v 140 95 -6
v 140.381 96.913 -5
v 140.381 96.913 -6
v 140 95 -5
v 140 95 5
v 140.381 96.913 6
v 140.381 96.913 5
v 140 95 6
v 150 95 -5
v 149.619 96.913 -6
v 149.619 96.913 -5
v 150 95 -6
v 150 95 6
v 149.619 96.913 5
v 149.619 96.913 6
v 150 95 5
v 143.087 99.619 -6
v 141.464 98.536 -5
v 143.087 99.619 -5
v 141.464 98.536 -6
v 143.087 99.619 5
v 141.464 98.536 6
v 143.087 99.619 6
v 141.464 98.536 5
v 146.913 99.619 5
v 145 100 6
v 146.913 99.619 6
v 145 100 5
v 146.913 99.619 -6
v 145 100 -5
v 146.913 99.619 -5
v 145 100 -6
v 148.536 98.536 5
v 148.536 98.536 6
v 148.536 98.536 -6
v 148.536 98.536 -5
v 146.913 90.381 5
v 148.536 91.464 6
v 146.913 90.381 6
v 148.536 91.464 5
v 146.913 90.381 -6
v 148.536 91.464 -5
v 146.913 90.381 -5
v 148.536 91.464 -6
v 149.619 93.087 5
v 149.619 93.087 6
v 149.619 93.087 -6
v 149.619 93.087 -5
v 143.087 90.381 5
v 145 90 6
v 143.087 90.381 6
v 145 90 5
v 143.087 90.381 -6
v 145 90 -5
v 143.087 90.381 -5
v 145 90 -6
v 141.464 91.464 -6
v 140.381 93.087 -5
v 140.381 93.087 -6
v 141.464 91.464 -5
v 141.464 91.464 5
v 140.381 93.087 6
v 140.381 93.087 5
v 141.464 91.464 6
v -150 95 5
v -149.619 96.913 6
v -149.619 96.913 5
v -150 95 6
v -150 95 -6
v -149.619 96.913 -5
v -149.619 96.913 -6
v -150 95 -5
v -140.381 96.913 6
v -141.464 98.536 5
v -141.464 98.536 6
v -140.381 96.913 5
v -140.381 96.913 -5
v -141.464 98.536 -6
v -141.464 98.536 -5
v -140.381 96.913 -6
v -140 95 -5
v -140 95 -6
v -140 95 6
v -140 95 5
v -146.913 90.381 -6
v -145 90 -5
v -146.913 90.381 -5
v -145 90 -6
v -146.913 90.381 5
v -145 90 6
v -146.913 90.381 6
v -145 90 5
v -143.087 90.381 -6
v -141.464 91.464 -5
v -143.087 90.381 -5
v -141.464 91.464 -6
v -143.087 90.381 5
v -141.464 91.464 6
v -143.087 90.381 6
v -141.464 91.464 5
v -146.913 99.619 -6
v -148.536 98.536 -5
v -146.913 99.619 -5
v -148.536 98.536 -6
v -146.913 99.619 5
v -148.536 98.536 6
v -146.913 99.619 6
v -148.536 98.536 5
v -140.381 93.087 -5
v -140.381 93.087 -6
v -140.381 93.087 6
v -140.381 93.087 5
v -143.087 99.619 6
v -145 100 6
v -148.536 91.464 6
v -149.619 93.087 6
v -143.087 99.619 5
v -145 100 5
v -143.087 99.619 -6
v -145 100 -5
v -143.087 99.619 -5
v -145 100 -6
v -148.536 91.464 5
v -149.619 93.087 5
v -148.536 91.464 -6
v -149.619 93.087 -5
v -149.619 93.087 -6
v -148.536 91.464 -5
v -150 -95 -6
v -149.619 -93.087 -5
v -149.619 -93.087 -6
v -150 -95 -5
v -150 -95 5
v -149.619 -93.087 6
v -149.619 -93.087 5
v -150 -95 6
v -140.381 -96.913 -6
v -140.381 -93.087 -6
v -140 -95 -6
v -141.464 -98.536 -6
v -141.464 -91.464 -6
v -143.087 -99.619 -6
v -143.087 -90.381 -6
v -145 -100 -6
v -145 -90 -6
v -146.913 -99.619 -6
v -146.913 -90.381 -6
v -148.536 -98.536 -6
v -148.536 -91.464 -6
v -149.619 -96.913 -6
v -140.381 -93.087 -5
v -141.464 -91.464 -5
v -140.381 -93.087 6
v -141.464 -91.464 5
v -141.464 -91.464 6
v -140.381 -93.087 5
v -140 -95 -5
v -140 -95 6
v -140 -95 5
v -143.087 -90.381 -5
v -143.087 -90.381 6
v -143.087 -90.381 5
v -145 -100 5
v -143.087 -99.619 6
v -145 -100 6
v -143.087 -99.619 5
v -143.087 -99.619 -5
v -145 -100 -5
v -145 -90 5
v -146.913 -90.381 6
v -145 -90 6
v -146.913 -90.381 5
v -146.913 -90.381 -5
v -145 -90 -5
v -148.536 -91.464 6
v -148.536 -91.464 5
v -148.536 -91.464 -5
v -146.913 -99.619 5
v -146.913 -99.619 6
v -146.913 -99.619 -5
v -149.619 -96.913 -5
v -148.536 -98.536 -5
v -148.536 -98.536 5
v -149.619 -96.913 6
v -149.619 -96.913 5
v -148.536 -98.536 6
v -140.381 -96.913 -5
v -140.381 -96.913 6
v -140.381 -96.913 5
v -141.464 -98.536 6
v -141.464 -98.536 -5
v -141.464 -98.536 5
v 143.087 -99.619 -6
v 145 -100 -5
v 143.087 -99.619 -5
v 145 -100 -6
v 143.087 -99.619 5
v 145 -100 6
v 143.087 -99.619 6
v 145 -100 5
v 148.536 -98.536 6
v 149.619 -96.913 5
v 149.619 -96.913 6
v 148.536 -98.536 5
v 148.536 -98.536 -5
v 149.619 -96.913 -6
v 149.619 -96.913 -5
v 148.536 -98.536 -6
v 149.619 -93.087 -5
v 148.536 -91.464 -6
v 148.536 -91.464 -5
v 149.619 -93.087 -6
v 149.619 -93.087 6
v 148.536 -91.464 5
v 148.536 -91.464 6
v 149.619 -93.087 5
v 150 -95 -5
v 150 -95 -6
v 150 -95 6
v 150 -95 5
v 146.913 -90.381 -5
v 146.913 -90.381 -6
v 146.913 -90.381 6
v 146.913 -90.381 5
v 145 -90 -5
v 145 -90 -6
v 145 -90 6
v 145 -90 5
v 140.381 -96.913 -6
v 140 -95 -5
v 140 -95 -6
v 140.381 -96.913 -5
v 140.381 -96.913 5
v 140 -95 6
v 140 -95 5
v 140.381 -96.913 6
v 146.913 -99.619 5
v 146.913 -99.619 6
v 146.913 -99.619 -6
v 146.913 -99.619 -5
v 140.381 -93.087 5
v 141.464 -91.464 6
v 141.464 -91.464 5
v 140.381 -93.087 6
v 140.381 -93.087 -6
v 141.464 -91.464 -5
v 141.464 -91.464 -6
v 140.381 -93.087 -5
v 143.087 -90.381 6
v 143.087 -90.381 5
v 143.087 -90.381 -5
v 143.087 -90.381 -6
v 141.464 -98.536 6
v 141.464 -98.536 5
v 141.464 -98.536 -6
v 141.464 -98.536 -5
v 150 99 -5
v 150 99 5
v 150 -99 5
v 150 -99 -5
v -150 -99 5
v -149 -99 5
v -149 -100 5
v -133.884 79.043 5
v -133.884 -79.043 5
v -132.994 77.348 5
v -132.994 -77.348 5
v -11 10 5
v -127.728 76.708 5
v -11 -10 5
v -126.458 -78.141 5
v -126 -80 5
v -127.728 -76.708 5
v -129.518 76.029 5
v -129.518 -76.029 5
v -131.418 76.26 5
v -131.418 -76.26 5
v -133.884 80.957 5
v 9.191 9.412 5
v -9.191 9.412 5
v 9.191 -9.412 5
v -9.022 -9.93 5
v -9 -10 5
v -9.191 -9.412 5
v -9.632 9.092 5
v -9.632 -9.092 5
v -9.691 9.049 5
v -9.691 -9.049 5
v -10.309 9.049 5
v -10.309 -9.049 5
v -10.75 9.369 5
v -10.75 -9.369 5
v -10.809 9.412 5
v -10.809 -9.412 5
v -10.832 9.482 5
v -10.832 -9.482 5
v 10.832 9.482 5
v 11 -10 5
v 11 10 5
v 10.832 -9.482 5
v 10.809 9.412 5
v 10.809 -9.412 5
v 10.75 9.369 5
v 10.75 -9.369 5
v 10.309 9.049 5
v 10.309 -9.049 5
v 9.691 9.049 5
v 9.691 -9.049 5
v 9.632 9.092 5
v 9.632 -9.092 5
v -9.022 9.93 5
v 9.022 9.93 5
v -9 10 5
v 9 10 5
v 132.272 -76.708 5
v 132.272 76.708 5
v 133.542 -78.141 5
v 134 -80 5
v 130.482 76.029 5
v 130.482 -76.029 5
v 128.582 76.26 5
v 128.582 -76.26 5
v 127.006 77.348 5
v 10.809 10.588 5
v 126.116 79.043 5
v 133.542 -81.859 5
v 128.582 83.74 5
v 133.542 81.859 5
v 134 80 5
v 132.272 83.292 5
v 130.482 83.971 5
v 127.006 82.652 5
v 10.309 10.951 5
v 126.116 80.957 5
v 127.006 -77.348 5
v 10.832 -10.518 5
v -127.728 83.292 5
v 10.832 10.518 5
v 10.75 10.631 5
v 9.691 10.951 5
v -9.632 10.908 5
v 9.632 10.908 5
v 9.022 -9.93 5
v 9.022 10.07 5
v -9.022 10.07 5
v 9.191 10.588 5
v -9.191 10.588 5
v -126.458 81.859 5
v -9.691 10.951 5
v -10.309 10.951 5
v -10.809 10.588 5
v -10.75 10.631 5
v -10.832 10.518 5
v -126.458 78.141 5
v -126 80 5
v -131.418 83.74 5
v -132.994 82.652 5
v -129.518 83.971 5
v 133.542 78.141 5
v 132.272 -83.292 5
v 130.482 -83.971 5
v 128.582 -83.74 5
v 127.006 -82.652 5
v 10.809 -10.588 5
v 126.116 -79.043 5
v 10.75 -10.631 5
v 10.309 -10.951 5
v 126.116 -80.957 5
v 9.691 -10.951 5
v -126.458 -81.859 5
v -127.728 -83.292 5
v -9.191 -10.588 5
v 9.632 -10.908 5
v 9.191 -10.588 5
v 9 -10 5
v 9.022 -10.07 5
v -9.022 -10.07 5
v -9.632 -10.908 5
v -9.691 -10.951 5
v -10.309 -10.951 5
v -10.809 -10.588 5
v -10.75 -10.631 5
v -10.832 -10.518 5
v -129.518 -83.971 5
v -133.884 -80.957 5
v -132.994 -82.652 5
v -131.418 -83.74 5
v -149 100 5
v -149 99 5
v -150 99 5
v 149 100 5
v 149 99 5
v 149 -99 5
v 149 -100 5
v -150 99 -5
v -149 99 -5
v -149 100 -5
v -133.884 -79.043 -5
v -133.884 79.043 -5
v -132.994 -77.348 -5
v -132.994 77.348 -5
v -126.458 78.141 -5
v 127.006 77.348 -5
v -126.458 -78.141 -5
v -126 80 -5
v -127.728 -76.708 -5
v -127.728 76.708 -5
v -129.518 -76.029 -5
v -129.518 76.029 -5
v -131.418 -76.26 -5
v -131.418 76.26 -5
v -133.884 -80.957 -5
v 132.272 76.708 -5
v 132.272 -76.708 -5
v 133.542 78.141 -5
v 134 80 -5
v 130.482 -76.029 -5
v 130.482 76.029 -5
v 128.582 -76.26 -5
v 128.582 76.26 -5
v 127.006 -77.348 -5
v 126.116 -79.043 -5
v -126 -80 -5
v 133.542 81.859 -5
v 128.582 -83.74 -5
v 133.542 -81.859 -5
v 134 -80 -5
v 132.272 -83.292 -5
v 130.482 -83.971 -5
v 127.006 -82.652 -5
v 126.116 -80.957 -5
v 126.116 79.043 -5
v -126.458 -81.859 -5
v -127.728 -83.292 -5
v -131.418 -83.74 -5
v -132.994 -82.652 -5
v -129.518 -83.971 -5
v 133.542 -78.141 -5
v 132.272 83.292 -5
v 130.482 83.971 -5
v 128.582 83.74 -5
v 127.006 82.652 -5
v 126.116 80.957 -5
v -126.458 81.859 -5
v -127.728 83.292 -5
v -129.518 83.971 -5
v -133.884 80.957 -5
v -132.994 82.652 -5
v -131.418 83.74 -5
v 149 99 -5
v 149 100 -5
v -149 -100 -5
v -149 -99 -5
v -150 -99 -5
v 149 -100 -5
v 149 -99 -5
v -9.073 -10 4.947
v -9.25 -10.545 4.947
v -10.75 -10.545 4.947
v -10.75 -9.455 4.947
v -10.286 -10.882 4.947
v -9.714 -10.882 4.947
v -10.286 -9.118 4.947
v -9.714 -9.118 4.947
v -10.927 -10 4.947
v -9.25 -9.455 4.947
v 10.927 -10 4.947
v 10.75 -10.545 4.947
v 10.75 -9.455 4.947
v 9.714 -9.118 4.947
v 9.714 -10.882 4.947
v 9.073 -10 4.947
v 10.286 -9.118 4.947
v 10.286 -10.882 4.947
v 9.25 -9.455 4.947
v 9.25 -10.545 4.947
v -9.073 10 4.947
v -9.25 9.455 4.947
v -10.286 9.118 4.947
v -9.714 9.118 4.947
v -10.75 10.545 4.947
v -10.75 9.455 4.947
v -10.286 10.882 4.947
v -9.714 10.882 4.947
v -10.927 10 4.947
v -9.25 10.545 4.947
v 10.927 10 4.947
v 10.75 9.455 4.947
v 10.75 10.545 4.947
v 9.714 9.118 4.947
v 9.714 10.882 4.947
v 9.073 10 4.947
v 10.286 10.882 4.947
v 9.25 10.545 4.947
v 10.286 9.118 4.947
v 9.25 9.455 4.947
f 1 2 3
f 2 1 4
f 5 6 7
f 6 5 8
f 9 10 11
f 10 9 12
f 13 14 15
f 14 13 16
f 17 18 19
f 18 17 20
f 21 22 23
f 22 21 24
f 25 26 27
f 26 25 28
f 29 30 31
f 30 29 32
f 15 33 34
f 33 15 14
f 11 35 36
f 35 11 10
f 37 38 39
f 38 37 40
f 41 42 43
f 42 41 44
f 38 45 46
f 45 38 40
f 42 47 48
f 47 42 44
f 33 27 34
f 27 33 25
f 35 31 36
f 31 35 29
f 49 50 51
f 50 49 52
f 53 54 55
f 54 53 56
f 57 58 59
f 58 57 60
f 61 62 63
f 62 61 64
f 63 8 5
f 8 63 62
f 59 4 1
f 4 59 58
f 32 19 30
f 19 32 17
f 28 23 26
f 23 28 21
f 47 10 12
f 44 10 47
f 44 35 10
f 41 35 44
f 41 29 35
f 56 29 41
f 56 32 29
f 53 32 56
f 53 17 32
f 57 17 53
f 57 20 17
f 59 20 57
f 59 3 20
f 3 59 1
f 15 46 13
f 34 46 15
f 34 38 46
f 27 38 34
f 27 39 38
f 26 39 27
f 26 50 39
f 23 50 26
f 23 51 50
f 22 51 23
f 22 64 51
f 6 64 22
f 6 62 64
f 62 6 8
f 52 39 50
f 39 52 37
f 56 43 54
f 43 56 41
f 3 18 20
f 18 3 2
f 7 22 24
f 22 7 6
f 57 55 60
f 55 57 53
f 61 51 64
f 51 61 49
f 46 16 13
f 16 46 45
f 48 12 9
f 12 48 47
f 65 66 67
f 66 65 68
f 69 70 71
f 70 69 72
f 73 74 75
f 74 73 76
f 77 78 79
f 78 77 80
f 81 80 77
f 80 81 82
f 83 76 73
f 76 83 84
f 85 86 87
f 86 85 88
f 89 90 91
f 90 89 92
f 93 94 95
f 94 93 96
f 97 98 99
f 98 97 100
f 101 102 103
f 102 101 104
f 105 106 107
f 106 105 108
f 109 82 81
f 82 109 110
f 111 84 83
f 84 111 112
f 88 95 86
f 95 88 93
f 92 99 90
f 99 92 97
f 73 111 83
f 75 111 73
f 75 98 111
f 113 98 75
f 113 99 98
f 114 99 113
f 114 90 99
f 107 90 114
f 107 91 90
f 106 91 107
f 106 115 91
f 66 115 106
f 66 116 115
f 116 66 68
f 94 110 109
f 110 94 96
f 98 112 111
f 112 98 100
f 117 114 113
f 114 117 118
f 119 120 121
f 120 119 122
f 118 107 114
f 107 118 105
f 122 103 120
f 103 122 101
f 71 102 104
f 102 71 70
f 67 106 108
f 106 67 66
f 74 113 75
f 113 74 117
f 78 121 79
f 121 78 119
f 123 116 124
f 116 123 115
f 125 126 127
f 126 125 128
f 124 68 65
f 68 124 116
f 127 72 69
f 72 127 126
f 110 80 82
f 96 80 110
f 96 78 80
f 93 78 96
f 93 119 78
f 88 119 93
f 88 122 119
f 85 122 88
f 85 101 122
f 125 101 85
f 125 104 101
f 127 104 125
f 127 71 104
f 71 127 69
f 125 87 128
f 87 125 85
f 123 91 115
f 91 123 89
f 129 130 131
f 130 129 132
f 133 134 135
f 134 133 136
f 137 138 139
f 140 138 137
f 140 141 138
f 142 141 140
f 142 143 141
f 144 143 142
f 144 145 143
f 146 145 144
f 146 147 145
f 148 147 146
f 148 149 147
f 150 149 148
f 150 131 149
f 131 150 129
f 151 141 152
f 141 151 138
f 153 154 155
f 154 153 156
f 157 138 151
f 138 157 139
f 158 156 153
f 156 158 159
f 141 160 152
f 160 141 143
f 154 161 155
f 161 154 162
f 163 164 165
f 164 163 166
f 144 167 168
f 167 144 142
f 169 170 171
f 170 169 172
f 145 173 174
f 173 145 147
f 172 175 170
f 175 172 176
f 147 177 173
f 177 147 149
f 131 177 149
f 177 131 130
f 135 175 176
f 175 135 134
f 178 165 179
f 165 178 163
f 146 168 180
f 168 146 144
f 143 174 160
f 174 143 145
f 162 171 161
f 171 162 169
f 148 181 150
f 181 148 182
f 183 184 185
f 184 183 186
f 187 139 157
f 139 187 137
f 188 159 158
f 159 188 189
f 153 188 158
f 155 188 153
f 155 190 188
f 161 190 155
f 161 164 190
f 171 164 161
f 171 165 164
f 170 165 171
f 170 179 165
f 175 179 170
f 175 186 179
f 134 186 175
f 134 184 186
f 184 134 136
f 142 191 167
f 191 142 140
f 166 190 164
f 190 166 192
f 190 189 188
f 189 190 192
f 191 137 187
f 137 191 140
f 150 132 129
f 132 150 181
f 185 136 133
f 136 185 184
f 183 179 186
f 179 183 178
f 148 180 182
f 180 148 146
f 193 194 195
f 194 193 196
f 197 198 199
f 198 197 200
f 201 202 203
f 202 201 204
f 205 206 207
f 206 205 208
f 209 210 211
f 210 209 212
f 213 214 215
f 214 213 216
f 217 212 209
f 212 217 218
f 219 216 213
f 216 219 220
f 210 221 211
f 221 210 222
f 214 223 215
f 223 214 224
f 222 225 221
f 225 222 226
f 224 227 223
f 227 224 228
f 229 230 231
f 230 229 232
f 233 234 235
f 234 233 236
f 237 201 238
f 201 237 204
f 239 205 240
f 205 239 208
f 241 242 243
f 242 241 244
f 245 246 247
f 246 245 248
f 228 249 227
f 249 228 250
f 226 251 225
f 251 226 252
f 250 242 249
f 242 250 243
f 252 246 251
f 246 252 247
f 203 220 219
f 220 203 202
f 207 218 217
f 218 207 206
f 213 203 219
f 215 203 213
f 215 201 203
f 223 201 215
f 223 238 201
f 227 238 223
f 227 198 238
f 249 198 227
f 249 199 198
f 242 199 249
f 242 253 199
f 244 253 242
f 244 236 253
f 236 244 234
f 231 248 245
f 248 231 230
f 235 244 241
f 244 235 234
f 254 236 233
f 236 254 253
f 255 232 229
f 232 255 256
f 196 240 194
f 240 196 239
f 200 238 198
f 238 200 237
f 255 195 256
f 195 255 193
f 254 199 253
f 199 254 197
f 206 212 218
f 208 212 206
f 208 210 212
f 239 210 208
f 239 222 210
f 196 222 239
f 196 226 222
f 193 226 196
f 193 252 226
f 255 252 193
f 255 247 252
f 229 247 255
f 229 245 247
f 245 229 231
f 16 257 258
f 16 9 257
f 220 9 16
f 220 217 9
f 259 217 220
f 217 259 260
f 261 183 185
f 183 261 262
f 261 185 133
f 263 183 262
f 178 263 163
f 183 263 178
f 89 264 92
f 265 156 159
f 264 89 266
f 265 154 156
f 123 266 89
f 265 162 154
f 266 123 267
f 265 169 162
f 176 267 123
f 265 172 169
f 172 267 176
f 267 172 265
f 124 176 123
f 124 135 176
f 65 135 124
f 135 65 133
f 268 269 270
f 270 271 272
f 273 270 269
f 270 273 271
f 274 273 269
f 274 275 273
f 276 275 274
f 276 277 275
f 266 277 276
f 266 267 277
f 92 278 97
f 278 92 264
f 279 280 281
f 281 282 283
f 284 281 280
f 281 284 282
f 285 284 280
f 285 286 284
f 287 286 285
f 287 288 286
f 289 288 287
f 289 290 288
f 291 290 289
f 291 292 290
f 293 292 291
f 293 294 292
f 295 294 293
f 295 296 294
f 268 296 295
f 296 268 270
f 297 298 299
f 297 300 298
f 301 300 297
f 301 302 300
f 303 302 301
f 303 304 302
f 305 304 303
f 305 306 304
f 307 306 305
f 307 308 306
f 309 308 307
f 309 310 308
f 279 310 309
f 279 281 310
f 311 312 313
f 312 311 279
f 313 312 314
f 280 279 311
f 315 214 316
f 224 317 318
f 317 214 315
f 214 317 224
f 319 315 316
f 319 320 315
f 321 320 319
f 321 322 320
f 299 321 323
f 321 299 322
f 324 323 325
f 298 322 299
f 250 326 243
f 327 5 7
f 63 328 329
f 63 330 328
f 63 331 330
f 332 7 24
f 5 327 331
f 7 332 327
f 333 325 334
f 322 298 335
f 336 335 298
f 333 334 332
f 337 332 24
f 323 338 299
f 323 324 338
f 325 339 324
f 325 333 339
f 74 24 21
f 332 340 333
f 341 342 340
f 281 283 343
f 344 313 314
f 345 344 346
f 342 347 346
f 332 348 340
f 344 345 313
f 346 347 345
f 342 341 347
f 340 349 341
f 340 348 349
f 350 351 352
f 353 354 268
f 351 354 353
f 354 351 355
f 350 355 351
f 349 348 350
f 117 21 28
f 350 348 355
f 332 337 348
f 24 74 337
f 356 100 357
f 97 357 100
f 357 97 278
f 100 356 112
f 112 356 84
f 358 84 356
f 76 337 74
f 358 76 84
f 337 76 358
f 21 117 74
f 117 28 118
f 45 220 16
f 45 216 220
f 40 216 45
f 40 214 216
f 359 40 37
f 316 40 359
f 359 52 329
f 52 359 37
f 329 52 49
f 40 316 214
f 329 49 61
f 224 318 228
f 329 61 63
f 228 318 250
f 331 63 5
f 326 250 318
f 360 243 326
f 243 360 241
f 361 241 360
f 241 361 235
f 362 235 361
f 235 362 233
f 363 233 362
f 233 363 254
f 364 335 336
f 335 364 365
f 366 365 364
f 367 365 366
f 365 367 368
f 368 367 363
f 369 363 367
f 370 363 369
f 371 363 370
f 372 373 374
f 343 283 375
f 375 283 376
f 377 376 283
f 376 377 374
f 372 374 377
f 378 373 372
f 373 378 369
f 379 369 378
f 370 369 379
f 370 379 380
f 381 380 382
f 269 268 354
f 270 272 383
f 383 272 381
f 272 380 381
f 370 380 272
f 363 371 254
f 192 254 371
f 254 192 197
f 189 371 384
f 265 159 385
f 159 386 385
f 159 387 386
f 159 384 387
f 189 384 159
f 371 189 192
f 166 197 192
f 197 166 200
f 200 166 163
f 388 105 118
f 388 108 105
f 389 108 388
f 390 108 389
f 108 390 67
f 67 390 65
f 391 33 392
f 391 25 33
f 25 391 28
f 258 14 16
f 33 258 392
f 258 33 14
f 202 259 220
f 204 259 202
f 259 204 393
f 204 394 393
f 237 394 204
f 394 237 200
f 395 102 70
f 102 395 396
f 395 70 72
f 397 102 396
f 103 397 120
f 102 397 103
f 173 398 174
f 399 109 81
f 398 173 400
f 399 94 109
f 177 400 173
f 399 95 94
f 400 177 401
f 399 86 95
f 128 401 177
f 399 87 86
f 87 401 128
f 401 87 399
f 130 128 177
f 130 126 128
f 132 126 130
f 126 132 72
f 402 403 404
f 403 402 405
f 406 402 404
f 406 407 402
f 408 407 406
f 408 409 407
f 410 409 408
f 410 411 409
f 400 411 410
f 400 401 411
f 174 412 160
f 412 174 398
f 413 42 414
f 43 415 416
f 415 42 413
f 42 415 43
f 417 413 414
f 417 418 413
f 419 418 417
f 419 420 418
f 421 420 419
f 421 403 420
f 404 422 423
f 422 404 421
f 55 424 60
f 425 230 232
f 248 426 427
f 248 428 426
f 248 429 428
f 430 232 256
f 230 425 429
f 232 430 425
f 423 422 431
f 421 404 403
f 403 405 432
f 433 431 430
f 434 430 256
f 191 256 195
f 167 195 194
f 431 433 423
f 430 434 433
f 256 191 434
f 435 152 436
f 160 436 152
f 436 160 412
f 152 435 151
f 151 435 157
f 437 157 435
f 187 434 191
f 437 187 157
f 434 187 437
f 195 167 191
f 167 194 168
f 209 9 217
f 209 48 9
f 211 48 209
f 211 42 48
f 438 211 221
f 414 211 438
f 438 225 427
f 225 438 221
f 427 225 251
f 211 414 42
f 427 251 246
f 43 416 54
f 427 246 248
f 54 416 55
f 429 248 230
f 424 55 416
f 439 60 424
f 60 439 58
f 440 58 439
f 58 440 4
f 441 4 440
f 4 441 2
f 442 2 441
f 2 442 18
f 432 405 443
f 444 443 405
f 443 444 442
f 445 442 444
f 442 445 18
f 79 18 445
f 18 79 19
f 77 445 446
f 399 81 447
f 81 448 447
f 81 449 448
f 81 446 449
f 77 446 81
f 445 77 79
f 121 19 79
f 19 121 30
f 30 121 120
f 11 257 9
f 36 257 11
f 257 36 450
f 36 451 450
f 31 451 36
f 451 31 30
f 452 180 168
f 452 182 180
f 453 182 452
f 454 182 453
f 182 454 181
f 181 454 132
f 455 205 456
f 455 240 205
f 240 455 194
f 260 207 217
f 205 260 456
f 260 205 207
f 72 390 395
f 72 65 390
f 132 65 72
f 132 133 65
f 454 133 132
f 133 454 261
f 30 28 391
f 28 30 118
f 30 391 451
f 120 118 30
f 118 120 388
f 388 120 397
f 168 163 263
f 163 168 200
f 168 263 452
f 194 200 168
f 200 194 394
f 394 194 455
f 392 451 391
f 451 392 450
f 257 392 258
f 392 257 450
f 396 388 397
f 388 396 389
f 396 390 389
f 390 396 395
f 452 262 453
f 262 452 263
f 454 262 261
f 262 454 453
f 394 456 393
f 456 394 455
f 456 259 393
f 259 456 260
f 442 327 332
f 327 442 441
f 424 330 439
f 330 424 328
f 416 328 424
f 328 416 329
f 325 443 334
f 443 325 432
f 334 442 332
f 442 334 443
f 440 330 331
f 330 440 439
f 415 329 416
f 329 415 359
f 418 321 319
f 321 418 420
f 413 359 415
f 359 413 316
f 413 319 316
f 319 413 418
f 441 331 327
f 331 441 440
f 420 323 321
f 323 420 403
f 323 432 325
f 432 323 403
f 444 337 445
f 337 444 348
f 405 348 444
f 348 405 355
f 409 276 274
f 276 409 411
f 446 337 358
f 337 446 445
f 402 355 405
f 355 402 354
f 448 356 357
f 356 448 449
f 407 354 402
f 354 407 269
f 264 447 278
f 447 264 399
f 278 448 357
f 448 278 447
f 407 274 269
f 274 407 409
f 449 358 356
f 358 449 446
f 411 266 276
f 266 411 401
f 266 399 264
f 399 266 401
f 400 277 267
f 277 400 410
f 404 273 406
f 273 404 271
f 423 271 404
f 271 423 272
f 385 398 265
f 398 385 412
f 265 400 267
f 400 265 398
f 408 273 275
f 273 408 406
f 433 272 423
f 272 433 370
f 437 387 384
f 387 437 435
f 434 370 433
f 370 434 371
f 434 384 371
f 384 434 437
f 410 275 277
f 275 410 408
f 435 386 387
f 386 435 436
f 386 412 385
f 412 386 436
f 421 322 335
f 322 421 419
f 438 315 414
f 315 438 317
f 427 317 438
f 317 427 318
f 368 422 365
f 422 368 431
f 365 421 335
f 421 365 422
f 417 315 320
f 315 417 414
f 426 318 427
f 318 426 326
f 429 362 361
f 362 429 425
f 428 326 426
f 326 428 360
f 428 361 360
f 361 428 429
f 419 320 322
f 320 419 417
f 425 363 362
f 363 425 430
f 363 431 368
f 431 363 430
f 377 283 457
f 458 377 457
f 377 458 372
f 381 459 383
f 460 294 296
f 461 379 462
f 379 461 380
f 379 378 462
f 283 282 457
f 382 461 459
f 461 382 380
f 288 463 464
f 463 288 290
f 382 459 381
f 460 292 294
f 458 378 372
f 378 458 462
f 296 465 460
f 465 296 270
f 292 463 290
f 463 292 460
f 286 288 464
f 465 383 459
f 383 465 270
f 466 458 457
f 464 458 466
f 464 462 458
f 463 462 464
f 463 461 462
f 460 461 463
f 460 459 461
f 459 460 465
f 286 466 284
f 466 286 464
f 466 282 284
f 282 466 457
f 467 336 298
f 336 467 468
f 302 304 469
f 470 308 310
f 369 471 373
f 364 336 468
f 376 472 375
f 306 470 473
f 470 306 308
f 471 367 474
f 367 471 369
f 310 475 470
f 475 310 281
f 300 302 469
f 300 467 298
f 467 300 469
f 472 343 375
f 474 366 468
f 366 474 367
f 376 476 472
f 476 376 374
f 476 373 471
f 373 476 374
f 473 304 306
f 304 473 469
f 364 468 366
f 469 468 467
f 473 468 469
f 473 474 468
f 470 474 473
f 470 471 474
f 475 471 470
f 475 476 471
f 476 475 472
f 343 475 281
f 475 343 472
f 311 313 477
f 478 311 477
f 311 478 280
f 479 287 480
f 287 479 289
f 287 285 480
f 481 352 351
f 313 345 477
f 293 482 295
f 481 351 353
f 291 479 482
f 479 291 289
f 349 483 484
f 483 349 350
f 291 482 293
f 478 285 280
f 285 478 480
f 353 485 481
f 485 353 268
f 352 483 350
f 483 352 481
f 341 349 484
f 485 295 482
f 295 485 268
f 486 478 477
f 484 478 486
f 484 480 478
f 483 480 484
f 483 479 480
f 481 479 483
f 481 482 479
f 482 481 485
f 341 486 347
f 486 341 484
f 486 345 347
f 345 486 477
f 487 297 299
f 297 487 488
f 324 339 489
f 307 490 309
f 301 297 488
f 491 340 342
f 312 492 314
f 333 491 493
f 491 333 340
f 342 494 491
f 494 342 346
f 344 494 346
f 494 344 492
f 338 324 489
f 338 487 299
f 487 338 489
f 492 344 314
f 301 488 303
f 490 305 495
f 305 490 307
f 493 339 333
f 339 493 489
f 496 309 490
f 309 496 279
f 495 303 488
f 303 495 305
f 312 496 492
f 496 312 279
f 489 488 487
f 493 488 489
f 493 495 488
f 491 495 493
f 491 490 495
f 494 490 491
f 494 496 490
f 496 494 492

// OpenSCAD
// Parameters
plate_length = 300; //[150:600:1]
plate_width = 200; //[100:400:1]
plate_thickness = 10; //[5:20:1]
corner_radius = 5; //[0:20:1]
chamfer_size = 1; //[0:5:0.5]
corner_overlap = 1; //[0.5:2:0.5]
hole_diameter = 8; //[3:20:0.5]
hole_edge_margin = 20; //[10:60:1]
hole_through_extra = 2; //[1:5:0.5]
texture_depth = 0.2; //[0:1:0.05]
texture_pitch = 20; //[10:60:1]
texture_dimple_radius = 3; //[1:10:0.5]

// Base shapes
module tooling_plate_body() {
  translate([0, 0, 0])
    cube([plate_length, plate_width, plate_thickness], center=true);
}

module corner_round_cyl() {
  translate([plate_length/2 - corner_radius, plate_width/2 - corner_radius, 0])
    cylinder(h=plate_thickness + 2*corner_overlap, r=corner_radius, center=true);
}

module corner_round_cyl_2() {
  translate([-plate_length/2 + corner_radius, plate_width/2 - corner_radius, 0])
    cylinder(h=plate_thickness + 2*corner_overlap, r=corner_radius, center=true);
}

module corner_round_cyl_3() {
  translate([-plate_length/2 + corner_radius, -plate_width/2 + corner_radius, 0])
    cylinder(h=plate_thickness + 2*corner_overlap, r=corner_radius, center=true);
}

module corner_round_cyl_4() {
  translate([plate_length/2 - corner_radius, -plate_width/2 + corner_radius, 0])
    cylinder(h=plate_thickness + 2*corner_overlap, r=corner_radius, center=true);
}

module corner_chamfer_cut_1() {
  translate([plate_length/2 - chamfer_size/2, plate_width/2 - chamfer_size/2, 0])
    cube([chamfer_size, chamfer_size, plate_thickness + 2*corner_overlap], center=true);
}

module corner_chamfer_cut_2() {
  translate([-plate_length/2 + chamfer_size/2, plate_width/2 - chamfer_size/2, 0])
    cube([chamfer_size, chamfer_size, plate_thickness + 2*corner_overlap], center=true);
}

module corner_chamfer_cut_3() {
  translate([-plate_length/2 + chamfer_size/2, -plate_width/2 + chamfer_size/2, 0])
    cube([chamfer_size, chamfer_size, plate_thickness + 2*corner_overlap], center=true);
}

module corner_chamfer_cut_4() {
  translate([plate_length/2 - chamfer_size/2, -plate_width/2 + chamfer_size/2, 0])
    cube([chamfer_size, chamfer_size, plate_thickness + 2*corner_overlap], center=true);
}

module mount_hole_1() {
  translate([plate_length/2 - hole_edge_margin, plate_width/2 - hole_edge_margin, 0])
    cylinder(h=plate_thickness + hole_through_extra, r=hole_diameter/2, center=true);
}

module mount_hole_2() {
  translate([-plate_length/2 + hole_edge_margin, plate_width/2 - hole_edge_margin, 0])
    cylinder(h=plate_thickness + hole_through_extra, r=hole_diameter/2, center=true);
}

module mount_hole_3() {
  translate([-plate_length/2 + hole_edge_margin, -plate_width/2 + hole_edge_margin, 0])
    cylinder(h=plate_thickness + hole_through_extra, r=hole_diameter/2, center=true);
}

module mount_hole_4() {
  translate([plate_length/2 - hole_edge_margin, -plate_width/2 + hole_edge_margin, 0])
    cylinder(h=plate_thickness + hole_through_extra, r=hole_diameter/2, center=true);
}

module texture_dimple_1() {
  translate([-texture_pitch/2, -texture_pitch/2, plate_thickness/2 - texture_depth + texture_dimple_radius])
    sphere(r=texture_dimple_radius, center=true);
}

module texture_dimple_2() {
  translate([texture_pitch/2, -texture_pitch/2, plate_thickness/2 - texture_depth + texture_dimple_radius])
    sphere(r=texture_dimple_radius, center=true);
}

module texture_dimple_3() {
  translate([-texture_pitch/2, texture_pitch/2, plate_thickness/2 - texture_depth + texture_dimple_radius])
    sphere(r=texture_dimple_radius, center=true);
}

module texture_dimple_4() {
  translate([texture_pitch/2, texture_pitch/2, plate_thickness/2 - texture_depth + texture_dimple_radius])
    sphere(r=texture_dimple_radius, center=true);
}

// Operations
module corner_radii_or_chamfers_union() {
  union() {
    corner_round_cyl();
    corner_round_cyl_2();
    corner_round_cyl_3();
    corner_round_cyl_4();
  }
}

module plate_with_corner_radii() {
  union() {
    tooling_plate_body();
    corner_radii_or_chamfers_union();
  }
}

module chamfer_cuts_union() {
  union() {
    corner_chamfer_cut_1();
    corner_chamfer_cut_2();
    corner_chamfer_cut_3();
    corner_chamfer_cut_4();
  }
}

module plate_with_corners() {
  difference() {
    plate_with_corner_radii();
    chamfer_cuts_union();
  }
}

module mounting_holes_union() {
  union() {
    mount_hole_1();
    mount_hole_2();
    mount_hole_3();
    mount_hole_4();
  }
}

module plate_with_mounting_holes() {
  difference() {
    plate_with_corners();
    mounting_holes_union();
  }
}

module surface_texture_union() {
  union() {
    texture_dimple_1();
    texture_dimple_2();
    texture_dimple_3();
    texture_dimple_4();
  }
}

module plate_with_surface_texture() {
  difference() {
    plate_with_mounting_holes();
    surface_texture_union();
  }
}

// Final output
color("Silver") plate_with_surface_texture();
